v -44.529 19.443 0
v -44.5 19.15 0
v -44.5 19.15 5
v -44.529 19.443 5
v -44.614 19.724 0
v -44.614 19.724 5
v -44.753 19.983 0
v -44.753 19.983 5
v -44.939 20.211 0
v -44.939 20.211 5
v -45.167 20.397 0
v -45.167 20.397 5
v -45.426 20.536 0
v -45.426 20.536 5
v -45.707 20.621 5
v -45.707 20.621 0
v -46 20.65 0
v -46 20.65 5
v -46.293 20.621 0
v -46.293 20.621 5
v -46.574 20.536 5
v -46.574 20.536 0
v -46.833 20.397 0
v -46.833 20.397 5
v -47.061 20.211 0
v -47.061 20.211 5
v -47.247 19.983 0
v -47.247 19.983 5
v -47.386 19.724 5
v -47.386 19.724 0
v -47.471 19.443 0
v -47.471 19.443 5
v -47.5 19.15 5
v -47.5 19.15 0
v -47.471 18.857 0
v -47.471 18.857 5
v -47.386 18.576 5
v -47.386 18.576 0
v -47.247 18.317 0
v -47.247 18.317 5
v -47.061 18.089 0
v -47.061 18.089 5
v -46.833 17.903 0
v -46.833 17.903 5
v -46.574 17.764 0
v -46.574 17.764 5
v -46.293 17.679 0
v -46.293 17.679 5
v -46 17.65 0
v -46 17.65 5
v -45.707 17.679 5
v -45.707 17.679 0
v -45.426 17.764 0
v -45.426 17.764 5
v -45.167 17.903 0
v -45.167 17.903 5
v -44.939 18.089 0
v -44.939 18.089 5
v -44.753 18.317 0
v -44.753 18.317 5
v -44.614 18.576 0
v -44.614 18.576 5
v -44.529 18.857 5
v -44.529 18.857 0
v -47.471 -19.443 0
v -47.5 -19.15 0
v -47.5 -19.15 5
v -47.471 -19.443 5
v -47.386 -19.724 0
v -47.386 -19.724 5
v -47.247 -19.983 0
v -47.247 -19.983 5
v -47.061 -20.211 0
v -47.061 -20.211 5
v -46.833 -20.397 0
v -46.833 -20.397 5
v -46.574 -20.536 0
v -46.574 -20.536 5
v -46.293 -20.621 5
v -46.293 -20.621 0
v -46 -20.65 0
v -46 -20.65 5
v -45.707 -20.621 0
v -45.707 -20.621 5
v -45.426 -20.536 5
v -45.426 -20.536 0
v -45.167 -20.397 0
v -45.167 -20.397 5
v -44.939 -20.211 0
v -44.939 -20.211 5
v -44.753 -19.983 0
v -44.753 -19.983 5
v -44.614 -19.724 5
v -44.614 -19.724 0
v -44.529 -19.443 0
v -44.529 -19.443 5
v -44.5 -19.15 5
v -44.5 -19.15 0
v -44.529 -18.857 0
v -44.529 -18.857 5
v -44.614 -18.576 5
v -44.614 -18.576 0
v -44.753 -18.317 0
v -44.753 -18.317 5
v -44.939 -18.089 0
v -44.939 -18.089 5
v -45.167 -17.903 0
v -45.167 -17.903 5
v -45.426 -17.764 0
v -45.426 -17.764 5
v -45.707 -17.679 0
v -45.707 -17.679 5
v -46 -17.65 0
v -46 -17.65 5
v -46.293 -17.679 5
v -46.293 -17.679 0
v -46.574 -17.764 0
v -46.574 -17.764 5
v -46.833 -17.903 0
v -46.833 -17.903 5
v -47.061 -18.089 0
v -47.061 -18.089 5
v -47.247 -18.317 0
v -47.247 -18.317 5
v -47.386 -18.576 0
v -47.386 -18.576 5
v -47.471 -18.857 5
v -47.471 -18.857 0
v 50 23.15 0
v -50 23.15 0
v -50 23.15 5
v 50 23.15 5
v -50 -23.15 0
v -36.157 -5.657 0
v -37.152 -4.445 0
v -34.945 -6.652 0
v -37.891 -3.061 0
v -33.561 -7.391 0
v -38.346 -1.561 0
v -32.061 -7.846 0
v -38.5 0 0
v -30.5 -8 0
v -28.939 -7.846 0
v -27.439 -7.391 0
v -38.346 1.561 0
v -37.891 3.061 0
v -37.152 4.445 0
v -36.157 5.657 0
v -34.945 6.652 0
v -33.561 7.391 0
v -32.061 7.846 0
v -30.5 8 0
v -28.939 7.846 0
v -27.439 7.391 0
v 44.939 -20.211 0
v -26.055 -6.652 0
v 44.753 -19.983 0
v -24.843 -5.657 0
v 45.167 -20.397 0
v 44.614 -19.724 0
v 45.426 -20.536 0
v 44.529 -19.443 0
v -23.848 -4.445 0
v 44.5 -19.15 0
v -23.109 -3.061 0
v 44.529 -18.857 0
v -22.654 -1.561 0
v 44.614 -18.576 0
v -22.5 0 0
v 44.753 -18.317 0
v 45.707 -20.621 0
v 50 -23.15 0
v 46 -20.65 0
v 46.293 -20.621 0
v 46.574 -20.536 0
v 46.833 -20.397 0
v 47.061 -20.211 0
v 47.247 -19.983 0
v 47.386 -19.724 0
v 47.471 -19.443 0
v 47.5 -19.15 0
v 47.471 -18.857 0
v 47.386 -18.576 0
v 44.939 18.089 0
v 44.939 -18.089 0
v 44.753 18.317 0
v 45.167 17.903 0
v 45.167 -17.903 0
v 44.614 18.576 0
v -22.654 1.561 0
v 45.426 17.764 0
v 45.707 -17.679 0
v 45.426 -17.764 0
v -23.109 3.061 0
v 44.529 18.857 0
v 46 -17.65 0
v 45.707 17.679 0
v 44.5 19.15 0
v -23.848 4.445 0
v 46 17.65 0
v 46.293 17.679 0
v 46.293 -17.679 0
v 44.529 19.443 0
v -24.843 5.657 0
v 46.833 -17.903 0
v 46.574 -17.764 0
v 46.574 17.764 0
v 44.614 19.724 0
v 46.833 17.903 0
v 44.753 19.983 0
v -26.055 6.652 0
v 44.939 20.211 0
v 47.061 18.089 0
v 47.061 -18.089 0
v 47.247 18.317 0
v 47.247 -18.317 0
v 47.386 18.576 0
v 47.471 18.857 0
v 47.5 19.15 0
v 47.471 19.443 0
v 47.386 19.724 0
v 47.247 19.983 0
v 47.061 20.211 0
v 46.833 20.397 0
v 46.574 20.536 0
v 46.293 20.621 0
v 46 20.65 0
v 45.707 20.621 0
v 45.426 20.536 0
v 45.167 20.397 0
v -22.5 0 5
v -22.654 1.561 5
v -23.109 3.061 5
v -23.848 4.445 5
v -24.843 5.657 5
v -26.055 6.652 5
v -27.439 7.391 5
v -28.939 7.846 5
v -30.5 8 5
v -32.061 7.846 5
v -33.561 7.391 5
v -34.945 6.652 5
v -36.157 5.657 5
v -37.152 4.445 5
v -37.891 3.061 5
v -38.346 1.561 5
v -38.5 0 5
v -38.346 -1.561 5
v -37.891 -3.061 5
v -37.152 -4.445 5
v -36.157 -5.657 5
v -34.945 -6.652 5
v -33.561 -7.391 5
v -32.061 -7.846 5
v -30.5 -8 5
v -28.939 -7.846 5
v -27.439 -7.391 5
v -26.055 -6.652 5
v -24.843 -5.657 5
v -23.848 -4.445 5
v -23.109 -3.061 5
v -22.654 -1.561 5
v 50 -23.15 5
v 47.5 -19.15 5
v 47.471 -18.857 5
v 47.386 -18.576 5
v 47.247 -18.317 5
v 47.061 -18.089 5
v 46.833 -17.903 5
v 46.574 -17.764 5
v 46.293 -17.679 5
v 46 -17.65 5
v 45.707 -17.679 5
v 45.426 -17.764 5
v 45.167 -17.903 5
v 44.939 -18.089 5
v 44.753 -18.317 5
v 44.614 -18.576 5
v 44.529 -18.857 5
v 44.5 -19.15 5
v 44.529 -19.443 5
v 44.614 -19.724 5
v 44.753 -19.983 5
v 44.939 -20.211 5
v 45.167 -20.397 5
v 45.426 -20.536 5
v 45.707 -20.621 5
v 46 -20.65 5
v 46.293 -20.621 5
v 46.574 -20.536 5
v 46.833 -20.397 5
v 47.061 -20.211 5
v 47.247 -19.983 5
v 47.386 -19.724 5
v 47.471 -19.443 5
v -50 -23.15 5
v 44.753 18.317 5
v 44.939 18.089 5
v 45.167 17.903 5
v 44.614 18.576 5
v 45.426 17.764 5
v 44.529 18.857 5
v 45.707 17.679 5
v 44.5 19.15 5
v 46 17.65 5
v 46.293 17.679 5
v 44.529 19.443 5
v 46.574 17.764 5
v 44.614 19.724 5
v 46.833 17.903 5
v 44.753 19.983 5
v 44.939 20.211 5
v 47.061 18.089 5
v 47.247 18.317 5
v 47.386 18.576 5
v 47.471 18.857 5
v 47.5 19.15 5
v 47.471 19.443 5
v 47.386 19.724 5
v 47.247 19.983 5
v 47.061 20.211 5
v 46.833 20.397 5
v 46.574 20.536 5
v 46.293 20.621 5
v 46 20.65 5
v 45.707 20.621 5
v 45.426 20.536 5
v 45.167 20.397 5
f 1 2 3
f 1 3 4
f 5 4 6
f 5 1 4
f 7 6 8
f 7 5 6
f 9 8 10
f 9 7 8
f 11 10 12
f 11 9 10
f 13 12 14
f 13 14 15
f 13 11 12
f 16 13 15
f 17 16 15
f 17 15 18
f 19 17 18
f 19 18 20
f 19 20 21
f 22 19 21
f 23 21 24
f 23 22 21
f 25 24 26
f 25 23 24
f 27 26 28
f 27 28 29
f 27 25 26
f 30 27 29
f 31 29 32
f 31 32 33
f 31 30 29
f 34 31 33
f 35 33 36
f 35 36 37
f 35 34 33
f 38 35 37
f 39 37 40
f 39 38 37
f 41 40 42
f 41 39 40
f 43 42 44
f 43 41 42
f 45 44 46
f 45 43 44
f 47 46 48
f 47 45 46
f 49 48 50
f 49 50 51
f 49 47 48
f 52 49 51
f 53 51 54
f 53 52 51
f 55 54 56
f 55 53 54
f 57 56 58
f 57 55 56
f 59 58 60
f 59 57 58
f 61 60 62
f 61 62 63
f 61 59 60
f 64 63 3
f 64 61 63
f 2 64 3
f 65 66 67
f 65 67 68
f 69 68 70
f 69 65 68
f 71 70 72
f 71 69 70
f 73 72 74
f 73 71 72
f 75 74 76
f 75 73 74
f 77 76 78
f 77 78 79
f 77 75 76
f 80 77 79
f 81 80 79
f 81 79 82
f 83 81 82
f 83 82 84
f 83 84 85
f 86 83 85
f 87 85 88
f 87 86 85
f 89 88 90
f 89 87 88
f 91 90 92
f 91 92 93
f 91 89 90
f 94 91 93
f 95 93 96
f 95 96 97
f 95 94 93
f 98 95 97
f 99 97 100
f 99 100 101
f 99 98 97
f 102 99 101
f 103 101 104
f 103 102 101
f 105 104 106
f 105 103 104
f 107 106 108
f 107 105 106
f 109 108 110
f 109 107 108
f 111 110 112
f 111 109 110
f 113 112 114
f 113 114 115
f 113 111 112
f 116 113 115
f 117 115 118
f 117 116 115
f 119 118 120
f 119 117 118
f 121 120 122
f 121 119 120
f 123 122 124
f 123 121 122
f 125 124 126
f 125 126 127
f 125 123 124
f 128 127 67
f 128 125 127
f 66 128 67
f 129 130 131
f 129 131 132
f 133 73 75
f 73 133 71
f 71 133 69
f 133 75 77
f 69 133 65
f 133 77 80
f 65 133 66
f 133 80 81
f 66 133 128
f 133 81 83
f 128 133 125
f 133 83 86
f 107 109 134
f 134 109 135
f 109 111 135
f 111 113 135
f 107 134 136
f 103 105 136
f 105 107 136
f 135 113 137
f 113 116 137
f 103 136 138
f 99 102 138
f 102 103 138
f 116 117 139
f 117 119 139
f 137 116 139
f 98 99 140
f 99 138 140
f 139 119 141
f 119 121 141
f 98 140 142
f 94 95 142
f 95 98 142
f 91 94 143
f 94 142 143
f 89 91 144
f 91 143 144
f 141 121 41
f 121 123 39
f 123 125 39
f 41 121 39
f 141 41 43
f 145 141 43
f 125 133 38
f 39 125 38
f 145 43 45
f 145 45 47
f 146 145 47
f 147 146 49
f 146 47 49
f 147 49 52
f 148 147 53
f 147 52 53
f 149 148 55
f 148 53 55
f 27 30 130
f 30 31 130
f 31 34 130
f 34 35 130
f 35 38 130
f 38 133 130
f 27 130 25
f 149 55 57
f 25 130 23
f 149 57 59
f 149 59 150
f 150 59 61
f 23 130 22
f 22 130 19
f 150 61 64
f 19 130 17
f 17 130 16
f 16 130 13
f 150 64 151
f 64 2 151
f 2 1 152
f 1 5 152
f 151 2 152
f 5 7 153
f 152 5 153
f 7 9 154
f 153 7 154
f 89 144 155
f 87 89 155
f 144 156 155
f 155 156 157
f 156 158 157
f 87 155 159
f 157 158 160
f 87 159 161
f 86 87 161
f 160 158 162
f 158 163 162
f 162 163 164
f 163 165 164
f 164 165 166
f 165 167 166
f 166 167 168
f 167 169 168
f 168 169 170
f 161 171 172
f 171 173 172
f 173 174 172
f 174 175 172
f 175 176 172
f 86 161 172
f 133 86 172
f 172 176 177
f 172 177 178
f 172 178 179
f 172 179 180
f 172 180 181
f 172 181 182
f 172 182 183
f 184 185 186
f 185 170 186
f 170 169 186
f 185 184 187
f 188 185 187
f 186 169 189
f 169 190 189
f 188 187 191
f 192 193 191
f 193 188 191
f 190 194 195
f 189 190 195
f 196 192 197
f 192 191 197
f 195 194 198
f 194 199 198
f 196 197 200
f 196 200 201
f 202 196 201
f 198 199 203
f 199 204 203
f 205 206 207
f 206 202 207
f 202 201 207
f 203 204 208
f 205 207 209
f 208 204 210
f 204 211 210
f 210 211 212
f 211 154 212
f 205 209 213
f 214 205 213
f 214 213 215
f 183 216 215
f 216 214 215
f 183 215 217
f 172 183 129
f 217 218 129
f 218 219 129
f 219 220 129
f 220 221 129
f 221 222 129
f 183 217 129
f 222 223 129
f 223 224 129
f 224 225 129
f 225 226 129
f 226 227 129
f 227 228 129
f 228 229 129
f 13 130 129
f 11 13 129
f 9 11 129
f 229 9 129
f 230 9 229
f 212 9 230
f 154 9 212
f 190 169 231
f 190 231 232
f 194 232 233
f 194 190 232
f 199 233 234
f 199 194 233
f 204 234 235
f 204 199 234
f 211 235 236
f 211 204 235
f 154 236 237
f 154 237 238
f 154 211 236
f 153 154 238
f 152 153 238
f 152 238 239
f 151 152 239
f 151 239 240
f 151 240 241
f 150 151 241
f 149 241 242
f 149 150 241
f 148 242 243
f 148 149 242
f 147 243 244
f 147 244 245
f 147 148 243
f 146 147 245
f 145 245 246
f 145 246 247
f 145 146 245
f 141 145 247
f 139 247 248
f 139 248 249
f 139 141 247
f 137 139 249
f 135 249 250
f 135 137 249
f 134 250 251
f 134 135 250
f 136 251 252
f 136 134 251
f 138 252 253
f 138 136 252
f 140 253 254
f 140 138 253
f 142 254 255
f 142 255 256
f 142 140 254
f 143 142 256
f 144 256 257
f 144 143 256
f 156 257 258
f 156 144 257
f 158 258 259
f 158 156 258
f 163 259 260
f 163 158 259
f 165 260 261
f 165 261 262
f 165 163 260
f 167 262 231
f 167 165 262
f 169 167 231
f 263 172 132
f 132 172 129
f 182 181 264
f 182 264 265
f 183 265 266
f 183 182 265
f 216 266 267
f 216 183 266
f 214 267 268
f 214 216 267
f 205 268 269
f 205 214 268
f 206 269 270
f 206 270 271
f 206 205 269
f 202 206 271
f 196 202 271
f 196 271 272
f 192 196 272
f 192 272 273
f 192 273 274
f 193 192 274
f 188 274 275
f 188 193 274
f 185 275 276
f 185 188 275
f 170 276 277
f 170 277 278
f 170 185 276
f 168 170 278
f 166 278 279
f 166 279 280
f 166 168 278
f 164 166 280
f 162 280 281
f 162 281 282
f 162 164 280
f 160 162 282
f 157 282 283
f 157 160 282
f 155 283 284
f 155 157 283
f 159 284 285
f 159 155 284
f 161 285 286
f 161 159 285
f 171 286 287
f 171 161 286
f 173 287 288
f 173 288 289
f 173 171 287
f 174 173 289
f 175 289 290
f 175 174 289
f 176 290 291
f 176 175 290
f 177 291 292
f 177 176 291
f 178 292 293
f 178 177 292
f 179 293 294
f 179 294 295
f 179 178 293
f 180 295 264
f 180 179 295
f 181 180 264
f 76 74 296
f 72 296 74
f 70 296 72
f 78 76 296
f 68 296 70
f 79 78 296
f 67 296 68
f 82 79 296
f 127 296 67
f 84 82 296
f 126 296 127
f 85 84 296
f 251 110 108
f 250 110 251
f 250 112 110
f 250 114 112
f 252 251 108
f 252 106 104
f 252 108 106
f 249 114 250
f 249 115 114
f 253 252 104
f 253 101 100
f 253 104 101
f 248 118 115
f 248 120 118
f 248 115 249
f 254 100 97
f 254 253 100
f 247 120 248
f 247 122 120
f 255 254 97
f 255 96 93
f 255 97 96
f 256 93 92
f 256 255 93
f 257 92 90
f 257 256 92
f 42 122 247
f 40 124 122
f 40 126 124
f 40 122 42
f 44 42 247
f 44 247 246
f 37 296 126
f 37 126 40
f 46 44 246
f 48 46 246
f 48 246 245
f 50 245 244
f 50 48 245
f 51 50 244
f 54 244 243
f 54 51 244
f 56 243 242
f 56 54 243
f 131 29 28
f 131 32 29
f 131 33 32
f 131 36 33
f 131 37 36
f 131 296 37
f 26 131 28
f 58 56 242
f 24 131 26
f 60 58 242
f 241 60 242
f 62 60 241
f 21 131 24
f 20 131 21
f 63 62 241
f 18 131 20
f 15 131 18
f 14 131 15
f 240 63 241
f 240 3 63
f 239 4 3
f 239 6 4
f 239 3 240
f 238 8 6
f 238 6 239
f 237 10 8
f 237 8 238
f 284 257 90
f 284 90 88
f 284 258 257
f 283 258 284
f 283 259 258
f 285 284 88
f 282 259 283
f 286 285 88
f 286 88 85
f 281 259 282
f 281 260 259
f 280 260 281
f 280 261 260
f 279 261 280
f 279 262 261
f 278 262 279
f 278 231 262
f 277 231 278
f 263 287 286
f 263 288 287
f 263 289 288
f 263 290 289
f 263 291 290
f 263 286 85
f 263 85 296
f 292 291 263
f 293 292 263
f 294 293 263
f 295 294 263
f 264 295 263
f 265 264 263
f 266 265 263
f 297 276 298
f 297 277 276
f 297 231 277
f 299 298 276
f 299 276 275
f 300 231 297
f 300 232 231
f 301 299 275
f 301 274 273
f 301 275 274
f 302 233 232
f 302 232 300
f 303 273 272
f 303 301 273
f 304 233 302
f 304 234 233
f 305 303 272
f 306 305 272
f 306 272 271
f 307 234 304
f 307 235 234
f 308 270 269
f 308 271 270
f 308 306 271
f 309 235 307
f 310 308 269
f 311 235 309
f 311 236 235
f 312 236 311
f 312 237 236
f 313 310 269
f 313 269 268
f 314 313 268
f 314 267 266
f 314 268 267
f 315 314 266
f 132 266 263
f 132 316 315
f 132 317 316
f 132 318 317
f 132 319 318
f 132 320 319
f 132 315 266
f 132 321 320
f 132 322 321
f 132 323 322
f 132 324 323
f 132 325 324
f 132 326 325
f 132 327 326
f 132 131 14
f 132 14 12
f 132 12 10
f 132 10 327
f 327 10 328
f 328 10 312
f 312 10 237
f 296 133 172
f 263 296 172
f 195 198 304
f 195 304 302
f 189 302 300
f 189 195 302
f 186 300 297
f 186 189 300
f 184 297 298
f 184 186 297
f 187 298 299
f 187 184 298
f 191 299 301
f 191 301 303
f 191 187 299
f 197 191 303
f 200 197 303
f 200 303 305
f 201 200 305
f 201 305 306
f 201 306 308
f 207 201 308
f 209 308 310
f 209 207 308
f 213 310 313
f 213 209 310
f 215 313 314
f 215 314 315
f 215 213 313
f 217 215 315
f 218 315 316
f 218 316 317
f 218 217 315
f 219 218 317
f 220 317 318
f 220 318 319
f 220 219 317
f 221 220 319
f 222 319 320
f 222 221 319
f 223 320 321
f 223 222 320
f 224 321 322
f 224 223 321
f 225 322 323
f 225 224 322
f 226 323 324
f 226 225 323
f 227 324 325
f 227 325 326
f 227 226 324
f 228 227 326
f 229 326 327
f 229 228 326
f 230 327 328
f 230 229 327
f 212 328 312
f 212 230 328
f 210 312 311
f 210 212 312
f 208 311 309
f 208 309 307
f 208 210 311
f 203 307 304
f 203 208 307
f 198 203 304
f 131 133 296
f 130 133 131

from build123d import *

# Parameters (mm, degrees)
SKETCH1_W           = 100
SKETCH1_H           = 46.3
SKETCH1_R           = 1.5
SKETCH1_R_2         = 8
BOSS_EXTRUDE1_DEPTH = 5


with BuildPart() as part:
    # Sketch1 → Boss-Extrude1 (new body)
    with BuildSketch(Plane.XY):
        Rectangle(SKETCH1_W, SKETCH1_H)
        with Locations(Location((46, 19.15, 0), (0, 0, 180))):
            Circle(SKETCH1_R, mode=Mode.SUBTRACT)
        with Locations((-46, 19.15)):
            Circle(SKETCH1_R, mode=Mode.SUBTRACT)
        with Locations((46, -19.15)):
            Circle(SKETCH1_R, mode=Mode.SUBTRACT)
        with Locations(Location((-46, -19.15, 0), (0, 0, 180))):
            Circle(SKETCH1_R, mode=Mode.SUBTRACT)
        with Locations((-30.5, 0)):
            Circle(SKETCH1_R_2, mode=Mode.SUBTRACT)
    extrude(amount=BOSS_EXTRUDE1_DEPTH)


solid = part.part
